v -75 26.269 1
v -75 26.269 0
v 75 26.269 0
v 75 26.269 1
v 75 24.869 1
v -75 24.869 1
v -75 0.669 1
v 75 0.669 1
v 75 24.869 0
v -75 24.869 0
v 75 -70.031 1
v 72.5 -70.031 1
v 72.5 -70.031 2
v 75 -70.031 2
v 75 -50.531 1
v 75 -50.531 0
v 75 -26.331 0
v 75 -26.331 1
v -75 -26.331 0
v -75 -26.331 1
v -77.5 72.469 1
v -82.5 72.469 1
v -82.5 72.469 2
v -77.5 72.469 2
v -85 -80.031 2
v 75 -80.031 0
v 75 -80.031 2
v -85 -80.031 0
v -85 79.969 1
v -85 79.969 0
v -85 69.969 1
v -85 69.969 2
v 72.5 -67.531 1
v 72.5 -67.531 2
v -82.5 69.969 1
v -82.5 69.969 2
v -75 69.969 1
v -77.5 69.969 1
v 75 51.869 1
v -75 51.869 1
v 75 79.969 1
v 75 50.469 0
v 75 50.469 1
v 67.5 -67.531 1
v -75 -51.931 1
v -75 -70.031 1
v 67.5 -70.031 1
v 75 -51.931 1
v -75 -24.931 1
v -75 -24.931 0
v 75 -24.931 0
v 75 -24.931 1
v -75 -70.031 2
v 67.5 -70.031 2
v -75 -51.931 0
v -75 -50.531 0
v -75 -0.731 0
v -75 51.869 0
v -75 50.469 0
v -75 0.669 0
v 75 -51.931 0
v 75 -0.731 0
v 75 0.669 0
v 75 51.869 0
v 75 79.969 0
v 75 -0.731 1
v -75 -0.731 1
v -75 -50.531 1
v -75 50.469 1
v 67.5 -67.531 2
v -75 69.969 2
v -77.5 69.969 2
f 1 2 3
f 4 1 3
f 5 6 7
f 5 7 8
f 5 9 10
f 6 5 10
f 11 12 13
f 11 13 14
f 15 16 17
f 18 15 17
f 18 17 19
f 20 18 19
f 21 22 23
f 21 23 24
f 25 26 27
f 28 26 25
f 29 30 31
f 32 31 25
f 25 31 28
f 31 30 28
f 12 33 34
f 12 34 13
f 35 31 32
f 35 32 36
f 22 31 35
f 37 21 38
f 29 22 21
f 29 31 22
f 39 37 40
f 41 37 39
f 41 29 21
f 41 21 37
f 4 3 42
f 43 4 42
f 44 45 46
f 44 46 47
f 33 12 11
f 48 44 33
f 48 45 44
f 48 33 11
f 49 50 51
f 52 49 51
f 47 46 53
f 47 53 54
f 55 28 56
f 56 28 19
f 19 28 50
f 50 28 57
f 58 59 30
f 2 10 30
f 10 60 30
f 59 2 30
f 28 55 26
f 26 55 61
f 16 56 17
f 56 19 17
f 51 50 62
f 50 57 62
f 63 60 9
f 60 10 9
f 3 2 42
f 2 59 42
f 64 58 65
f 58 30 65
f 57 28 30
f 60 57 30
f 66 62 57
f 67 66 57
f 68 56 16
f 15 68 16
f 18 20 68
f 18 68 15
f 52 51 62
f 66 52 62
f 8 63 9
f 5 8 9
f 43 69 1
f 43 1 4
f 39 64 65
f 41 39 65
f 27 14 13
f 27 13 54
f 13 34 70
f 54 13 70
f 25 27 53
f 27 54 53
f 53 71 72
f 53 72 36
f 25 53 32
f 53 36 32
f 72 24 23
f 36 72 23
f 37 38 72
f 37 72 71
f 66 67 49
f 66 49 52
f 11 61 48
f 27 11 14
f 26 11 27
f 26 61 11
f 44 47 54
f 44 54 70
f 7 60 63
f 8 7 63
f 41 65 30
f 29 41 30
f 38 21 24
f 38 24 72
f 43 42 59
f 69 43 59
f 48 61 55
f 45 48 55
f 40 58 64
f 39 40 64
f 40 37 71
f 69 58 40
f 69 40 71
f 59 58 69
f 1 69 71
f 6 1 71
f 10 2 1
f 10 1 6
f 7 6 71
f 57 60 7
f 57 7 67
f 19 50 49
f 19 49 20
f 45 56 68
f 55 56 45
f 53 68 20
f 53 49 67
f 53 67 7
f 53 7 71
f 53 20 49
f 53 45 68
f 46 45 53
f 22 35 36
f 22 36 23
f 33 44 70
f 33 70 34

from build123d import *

# Parameters (mm, degrees)
EXTRUDE_1_DEPTH = 1
EXTRUDE_2_DEPTH = 1


with BuildPart() as part:
    # 草图1 → 凸台-拉伸1 (new body)
    with BuildSketch(Plane.XY):
        Polygon((-75, 50.468617295), (-75, 51.868617295), (-65, 51.868617295), (75, 51.868617295), (75, 79.968617295), (-85, 79.968617295), (-85, -80.031382705), (75, -80.031382705), (75, -51.931382705), (-65, -51.931382705), (-75, -51.931382705), (-75, -50.531382705), (-65, -50.531382705), (75, -50.531382705), (75, -26.331382705), (-65, -26.331382705), (-75, -26.331382705), (-75, -24.931382705), (-65, -24.931382705), (75, -24.931382705), (75, -0.731382705), (-65, -0.731382705), (-75, -0.731382705), (-75, 0.668617295), (-65, 0.668617295), (75, 0.668617295), (75, 24.868617295), (-65, 24.868617295), (-75, 24.868617295), (-75, 26.268617295), (-65, 26.268617295), (75, 26.268617295), (75, 50.468617295), (-65, 50.468617295), align=None)
    extrude(amount=EXTRUDE_1_DEPTH)

    # 草图2 → 凸台-拉伸2 (add)
    with BuildSketch(Plane.XY.offset(1)):
        Polygon((-85, -80.031382705), (-85, -70.031382705), (-85, 69.968617295), (-82.5, 69.968617295), (-82.5, 72.468617295), (-77.5, 72.468617295), (-77.5, 69.968617295), (-75, 69.968617295), (-75, -70.031382705), (67.5, -70.031382705), (67.5, -67.531382705), (72.5, -67.531382705), (72.5, -70.031382705), (75, -70.031382705), (75, -80.031382705), align=None)
    extrude(amount=EXTRUDE_2_DEPTH)


solid = part.part
